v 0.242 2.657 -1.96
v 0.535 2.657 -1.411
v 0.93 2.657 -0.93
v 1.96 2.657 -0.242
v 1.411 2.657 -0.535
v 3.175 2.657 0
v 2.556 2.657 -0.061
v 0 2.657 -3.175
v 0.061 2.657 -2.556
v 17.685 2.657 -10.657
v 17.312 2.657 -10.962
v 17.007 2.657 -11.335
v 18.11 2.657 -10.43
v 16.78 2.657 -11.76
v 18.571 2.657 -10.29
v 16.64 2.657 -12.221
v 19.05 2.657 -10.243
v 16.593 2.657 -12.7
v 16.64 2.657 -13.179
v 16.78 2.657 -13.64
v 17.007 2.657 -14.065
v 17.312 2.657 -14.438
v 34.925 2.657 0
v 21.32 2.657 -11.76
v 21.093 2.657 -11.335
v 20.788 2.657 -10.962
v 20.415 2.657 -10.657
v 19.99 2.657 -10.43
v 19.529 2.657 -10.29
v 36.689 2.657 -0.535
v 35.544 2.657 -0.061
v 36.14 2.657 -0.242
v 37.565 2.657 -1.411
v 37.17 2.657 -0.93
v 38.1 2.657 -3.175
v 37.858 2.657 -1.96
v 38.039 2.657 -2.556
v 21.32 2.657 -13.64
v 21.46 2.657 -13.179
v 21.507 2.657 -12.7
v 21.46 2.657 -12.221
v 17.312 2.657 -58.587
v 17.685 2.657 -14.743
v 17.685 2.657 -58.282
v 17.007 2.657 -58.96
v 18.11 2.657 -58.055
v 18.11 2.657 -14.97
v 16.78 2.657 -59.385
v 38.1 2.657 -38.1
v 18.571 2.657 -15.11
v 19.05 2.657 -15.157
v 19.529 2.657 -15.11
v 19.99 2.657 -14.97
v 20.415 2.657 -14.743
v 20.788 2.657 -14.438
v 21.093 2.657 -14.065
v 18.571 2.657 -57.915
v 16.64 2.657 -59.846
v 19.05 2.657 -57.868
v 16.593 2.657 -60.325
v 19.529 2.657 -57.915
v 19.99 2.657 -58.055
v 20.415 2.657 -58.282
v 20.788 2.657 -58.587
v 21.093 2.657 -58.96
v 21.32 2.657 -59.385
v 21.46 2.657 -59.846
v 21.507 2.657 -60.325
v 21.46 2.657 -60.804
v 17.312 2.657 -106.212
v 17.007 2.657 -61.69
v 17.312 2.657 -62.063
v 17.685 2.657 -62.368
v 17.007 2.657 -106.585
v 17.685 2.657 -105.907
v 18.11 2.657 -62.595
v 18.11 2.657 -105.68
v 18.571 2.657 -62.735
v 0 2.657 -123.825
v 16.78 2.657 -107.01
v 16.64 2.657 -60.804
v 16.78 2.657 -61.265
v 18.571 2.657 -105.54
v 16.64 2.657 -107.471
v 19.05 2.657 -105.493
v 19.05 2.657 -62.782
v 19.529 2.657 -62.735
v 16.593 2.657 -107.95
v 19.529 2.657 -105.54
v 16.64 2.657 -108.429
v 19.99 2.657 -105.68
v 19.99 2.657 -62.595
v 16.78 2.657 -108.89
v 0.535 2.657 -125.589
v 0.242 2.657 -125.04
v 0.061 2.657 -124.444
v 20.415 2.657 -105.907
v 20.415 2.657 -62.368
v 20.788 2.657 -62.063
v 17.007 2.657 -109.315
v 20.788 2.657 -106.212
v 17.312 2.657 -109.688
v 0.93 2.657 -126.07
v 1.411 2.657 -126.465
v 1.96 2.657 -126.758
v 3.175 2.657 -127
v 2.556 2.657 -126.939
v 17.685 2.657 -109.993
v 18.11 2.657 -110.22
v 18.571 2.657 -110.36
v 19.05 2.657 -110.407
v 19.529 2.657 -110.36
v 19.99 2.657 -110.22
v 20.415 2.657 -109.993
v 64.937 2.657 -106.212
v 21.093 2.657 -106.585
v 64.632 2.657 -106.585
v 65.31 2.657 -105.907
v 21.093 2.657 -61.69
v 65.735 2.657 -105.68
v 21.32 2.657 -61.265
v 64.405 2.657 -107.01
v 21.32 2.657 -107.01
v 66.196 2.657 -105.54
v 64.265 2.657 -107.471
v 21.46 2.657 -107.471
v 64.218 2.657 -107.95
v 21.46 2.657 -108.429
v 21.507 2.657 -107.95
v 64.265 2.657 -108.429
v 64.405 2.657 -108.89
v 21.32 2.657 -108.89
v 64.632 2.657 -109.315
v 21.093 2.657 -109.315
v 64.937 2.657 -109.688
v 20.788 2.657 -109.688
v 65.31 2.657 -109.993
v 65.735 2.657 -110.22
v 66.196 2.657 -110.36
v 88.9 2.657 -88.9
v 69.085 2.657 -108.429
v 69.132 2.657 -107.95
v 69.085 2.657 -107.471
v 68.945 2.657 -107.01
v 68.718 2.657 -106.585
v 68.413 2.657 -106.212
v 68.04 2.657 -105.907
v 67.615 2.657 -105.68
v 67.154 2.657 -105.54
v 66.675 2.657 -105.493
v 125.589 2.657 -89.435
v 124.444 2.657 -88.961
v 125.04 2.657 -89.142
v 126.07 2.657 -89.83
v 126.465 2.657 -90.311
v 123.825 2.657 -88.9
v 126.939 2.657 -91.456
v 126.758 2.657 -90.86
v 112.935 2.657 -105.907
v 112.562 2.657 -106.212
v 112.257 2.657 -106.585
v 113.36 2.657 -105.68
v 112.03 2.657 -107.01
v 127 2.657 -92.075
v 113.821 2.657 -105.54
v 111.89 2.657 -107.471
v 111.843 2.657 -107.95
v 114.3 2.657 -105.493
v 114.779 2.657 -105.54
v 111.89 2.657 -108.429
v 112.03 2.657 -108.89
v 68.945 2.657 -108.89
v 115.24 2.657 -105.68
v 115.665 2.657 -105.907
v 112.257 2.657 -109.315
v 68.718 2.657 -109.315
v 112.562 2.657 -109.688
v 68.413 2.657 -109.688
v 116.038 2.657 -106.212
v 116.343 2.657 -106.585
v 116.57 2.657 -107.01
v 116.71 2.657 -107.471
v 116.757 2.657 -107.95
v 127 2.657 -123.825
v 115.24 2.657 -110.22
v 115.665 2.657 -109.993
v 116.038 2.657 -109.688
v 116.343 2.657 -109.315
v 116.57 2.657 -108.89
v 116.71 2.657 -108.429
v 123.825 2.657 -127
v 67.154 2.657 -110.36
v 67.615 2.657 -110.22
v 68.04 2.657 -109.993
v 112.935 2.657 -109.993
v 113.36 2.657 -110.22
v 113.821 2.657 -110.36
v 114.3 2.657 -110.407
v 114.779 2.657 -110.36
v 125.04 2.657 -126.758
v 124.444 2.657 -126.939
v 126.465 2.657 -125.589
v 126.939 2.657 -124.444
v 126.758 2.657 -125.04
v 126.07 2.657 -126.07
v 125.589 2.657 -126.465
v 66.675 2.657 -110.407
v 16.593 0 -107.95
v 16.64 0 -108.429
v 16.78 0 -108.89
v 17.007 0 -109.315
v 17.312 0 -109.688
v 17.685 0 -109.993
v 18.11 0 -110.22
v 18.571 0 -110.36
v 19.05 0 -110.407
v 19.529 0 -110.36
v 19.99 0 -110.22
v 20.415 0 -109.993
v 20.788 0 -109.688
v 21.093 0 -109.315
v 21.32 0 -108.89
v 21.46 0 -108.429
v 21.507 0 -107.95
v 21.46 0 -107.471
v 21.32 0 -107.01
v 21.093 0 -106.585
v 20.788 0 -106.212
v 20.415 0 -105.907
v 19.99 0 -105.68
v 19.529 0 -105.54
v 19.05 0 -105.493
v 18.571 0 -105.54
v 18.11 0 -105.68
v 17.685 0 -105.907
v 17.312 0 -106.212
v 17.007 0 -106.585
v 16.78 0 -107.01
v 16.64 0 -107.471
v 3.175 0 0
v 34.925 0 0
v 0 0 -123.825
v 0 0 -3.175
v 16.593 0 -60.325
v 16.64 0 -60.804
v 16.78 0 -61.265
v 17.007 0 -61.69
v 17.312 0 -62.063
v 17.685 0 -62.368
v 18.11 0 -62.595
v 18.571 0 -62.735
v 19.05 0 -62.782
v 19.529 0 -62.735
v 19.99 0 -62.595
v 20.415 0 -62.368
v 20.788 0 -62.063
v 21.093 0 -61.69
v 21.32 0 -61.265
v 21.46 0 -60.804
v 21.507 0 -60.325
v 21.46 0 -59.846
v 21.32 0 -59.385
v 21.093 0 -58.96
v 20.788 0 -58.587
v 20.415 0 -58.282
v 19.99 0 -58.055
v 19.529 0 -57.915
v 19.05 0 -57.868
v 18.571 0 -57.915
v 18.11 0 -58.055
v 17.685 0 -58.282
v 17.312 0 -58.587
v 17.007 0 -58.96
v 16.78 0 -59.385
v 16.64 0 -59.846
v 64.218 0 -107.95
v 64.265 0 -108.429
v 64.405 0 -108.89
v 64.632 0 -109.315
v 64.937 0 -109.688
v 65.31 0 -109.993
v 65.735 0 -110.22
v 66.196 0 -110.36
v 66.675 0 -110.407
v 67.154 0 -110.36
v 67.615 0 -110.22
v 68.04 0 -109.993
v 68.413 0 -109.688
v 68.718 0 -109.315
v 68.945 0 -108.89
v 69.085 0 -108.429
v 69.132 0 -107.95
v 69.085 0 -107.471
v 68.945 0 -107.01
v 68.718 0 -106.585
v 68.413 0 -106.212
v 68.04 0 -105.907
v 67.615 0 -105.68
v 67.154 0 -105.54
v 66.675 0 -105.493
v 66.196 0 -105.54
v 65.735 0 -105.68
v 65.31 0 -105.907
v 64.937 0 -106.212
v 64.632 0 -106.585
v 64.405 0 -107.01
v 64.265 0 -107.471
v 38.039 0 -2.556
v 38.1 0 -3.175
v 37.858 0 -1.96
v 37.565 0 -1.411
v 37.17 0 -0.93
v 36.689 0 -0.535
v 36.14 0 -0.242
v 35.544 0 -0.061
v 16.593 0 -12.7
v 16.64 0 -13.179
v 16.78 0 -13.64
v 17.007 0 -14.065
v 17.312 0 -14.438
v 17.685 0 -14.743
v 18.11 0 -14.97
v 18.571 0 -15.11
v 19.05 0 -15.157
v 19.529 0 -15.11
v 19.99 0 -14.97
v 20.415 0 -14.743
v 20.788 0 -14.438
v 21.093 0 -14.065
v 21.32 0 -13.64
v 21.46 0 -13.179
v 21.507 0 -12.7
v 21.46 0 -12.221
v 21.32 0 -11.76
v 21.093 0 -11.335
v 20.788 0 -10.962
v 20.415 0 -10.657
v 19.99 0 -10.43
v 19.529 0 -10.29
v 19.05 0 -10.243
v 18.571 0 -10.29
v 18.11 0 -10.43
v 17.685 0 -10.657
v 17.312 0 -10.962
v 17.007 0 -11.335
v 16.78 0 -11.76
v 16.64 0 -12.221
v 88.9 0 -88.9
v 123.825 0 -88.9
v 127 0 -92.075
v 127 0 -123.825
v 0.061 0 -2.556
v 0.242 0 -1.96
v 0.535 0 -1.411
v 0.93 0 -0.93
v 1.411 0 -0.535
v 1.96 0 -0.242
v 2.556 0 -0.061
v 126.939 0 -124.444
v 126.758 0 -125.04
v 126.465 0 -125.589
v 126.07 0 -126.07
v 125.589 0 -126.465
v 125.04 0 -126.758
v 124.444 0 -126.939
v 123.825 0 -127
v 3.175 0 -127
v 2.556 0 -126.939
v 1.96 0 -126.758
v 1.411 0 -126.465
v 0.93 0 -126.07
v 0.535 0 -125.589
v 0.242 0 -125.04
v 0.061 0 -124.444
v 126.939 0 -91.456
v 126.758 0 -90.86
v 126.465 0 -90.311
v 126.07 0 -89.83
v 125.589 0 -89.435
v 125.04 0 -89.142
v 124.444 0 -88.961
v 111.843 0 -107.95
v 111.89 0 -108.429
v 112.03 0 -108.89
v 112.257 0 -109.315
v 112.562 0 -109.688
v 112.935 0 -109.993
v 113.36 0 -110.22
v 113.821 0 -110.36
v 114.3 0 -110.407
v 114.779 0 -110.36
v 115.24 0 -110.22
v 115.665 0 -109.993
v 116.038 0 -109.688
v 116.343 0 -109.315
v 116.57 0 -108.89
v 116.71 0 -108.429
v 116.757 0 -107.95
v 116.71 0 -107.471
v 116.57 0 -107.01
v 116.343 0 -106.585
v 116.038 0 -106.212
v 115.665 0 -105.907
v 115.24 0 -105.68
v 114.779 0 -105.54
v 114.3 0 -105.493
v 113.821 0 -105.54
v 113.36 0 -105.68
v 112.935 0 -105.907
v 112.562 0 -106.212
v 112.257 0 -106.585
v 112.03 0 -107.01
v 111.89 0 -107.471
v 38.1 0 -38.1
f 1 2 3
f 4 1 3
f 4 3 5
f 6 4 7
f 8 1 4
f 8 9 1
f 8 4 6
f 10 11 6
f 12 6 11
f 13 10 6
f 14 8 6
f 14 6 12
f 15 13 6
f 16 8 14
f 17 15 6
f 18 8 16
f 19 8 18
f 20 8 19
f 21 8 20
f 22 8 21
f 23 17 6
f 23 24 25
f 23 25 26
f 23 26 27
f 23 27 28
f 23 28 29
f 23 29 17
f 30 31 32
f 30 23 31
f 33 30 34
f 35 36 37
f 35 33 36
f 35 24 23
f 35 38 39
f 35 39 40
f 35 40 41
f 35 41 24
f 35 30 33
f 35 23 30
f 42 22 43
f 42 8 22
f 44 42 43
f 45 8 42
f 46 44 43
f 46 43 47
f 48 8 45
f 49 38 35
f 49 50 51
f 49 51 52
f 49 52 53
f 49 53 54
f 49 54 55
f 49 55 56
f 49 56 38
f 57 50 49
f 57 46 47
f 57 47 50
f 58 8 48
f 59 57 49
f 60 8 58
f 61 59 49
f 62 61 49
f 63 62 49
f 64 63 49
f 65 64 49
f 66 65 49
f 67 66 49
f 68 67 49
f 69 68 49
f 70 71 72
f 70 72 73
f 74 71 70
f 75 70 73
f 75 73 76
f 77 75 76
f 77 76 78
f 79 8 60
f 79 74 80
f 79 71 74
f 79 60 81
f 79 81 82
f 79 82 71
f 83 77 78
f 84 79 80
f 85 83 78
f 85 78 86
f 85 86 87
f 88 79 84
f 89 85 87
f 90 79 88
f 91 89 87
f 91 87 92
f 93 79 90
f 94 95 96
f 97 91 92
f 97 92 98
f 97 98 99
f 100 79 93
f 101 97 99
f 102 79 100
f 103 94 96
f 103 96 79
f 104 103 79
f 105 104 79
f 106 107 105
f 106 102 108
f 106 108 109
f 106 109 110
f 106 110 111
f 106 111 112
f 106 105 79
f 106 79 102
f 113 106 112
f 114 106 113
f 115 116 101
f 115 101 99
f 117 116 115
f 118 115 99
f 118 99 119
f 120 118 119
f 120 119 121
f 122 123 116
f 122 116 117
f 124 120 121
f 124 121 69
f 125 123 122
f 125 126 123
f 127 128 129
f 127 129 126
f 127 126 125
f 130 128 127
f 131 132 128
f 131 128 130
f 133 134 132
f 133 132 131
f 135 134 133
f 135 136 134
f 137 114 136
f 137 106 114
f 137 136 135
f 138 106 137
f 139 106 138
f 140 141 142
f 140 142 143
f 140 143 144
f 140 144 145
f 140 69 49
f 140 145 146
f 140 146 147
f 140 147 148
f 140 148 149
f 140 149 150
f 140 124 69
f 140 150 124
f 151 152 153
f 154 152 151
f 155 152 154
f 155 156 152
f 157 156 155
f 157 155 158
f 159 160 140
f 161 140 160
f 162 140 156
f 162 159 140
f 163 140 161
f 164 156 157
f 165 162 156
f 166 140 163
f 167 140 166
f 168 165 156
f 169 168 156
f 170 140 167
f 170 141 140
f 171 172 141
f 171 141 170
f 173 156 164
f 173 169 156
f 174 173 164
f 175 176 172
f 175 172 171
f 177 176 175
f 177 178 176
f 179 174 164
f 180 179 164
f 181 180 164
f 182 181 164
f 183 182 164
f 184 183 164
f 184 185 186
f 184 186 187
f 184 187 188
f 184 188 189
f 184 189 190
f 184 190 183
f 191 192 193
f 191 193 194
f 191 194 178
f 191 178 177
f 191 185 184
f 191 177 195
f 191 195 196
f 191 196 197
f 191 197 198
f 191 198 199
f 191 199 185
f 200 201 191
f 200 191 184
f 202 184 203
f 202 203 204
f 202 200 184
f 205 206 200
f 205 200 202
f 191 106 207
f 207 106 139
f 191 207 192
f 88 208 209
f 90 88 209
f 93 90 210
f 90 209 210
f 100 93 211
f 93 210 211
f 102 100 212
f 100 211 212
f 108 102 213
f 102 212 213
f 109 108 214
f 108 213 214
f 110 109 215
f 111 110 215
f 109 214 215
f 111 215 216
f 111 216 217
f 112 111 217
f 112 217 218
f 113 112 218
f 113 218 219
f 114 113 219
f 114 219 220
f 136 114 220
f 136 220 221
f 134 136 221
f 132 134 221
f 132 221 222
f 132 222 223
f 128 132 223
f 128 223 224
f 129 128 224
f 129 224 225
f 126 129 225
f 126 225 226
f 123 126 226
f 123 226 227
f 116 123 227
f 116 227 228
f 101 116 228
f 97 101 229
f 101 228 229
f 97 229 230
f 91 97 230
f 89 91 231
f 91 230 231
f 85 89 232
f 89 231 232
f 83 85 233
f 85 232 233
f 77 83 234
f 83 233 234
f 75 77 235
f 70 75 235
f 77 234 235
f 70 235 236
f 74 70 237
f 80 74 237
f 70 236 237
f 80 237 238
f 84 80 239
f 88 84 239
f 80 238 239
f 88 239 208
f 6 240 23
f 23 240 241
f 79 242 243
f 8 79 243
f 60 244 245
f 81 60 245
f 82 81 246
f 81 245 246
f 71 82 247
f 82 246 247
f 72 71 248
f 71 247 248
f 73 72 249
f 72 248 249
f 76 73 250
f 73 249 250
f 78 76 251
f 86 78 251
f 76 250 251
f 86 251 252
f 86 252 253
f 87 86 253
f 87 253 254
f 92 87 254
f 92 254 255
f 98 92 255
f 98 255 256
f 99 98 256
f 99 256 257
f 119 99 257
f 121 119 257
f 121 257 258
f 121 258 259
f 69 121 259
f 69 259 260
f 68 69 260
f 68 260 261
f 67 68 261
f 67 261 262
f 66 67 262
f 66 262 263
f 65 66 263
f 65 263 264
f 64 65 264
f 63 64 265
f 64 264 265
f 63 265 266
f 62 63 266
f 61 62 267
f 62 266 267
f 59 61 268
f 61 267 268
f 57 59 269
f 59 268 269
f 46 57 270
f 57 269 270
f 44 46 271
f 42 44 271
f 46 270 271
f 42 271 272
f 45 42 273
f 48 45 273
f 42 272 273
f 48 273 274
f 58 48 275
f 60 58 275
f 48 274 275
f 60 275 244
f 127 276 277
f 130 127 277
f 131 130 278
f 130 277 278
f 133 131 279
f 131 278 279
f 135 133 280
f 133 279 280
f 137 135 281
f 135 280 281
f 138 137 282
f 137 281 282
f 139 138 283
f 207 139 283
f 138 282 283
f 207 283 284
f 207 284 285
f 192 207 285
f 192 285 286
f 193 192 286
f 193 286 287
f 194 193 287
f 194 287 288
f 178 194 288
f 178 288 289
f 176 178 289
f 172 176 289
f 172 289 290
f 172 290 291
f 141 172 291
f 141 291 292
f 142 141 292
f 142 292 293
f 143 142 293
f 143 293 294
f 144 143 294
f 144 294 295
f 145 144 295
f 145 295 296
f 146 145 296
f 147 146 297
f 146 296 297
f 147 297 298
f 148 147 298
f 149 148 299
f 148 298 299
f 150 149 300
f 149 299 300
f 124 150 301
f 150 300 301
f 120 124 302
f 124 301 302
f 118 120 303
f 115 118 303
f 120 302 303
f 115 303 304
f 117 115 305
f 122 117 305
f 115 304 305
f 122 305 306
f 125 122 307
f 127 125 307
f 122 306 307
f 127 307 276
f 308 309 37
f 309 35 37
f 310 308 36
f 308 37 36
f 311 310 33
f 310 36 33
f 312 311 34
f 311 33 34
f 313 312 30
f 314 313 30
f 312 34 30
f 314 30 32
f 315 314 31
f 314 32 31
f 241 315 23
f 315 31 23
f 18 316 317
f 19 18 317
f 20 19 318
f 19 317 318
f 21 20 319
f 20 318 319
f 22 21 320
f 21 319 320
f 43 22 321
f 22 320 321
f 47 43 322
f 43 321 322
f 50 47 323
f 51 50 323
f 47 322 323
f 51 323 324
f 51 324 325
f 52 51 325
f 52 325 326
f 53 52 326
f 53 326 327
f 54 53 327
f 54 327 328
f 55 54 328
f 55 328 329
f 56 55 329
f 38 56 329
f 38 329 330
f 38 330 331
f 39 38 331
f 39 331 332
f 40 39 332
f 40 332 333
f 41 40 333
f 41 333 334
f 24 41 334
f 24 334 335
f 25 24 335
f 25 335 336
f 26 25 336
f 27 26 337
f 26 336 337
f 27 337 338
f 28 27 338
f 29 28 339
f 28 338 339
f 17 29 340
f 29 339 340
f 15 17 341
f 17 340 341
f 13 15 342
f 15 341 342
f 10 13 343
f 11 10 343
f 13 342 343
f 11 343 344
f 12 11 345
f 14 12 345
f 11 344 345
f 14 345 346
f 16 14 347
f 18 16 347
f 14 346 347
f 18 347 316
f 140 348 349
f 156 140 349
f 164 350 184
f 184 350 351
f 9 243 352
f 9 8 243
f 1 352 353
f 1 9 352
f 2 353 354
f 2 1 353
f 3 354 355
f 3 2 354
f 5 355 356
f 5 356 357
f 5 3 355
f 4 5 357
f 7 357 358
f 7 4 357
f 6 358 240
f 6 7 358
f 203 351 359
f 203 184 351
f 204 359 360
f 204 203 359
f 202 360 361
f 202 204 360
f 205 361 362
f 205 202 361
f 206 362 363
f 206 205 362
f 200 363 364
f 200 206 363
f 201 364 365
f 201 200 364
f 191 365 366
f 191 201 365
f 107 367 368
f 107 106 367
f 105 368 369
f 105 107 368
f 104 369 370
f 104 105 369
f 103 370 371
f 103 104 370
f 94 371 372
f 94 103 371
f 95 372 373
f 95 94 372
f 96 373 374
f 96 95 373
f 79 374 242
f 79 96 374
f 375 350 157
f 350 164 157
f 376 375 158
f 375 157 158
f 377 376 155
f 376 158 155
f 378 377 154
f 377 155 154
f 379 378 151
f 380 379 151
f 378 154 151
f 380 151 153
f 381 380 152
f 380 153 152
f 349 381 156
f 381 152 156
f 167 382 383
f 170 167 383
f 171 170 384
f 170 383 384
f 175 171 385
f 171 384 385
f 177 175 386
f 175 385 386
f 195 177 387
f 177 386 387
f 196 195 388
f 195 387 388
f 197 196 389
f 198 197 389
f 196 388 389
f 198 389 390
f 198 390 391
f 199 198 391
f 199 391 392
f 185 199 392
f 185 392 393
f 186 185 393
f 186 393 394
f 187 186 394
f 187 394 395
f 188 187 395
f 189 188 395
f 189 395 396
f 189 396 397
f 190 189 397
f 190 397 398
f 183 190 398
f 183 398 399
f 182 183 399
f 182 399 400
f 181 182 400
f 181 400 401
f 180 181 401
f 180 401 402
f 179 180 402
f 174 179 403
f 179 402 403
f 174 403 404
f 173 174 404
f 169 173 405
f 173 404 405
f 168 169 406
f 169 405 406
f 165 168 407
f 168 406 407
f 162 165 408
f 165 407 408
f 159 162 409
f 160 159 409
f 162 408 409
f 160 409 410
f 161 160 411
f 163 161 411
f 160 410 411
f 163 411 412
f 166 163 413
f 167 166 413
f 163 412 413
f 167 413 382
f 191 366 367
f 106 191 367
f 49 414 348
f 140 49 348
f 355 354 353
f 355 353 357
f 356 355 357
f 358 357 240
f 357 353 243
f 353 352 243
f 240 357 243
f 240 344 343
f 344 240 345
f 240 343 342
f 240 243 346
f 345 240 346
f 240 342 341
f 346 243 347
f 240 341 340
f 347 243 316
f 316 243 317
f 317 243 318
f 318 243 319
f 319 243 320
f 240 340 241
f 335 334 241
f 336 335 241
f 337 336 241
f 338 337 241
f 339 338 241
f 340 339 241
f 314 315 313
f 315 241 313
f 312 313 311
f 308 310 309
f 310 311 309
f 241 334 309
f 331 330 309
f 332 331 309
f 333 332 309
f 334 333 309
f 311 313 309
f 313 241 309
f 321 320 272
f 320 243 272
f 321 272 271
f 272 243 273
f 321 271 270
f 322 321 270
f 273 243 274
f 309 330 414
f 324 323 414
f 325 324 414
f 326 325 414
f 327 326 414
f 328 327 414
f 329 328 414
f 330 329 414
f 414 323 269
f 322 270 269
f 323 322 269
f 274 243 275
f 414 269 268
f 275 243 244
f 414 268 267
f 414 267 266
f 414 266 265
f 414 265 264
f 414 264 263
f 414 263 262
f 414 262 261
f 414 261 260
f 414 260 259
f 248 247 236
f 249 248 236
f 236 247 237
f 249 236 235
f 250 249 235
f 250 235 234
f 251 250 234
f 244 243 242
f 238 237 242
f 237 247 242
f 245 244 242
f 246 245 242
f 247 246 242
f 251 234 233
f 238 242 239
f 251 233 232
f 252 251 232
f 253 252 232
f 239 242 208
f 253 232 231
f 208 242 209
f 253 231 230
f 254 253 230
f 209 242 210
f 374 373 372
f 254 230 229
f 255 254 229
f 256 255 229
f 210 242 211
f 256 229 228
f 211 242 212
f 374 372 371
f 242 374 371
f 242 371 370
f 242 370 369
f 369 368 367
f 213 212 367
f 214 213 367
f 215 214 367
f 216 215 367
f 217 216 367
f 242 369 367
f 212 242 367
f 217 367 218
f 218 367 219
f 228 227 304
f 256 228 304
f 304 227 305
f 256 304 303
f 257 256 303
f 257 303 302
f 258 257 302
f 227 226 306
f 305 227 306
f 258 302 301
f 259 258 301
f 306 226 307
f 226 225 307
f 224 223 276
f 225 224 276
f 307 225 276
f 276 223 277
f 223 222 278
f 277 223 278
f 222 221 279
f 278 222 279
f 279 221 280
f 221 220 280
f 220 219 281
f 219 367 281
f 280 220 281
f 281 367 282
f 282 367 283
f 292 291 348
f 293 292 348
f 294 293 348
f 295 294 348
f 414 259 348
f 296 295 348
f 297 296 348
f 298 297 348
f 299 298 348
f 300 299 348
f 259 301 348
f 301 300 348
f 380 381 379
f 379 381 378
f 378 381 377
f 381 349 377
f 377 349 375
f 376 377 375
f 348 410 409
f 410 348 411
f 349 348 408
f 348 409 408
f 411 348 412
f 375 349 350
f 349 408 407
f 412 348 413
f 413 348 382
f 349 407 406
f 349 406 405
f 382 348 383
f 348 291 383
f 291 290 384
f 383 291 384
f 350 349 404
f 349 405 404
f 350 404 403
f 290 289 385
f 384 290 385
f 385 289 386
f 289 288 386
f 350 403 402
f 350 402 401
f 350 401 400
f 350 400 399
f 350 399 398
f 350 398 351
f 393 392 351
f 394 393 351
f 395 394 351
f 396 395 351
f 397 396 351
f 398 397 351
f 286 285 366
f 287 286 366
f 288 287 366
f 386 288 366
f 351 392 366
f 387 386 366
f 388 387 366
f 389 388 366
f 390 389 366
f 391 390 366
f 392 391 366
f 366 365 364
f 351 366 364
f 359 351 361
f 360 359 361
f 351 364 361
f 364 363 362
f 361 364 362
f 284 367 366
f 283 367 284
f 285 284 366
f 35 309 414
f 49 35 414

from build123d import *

# Parameters (mm, degrees)
BOSS_EXTRUDE1_DEPTH          = 2.65684
F_10_0_1935_DIAMETER_HOLE1_D = 4.9149
FILLET1_R                    = 3.175


with BuildPart() as part:
    # Sketch1 → Boss-Extrude1 (new body)
    with BuildSketch(Plane(origin=(0, 0, 0), x_dir=(1, 0, 0), z_dir=(0, 1, 0))):
        Polygon((127, 88.9), (127, 127), (88.9, 127), (0, 127), (0, 0), (38.1, 0), (38.1, 38.1), (88.9, 88.9), align=None)
    extrude(amount=BOSS_EXTRUDE1_DEPTH)

    # #10 (0.1935) Diameter Hole1 (through all)
    with Locations(Plane(origin=(0, 2.65684, 0), x_dir=(1, 0, 0), z_dir=(0, 1, 0))):
        with Locations((114.3, 107.95), (66.675, 107.95), (19.05, 107.95), (19.05, 60.325), (19.05, 12.7)):
            Hole(F_10_0_1935_DIAMETER_HOLE1_D / 2)

    # Fillet1
    fillet1_edges = [part.edges().sort_by_distance(p)[0] for p in [
        (127, 1.32842, -88.9),
        (38.1, 1.32842, 0),
        (0, 1.32842, 0),
        (0, 1.32842, -127),
        (127, 1.32842, -127),
    ]]
    fillet(fillet1_edges, radius=FILLET1_R)


solid = part.part
